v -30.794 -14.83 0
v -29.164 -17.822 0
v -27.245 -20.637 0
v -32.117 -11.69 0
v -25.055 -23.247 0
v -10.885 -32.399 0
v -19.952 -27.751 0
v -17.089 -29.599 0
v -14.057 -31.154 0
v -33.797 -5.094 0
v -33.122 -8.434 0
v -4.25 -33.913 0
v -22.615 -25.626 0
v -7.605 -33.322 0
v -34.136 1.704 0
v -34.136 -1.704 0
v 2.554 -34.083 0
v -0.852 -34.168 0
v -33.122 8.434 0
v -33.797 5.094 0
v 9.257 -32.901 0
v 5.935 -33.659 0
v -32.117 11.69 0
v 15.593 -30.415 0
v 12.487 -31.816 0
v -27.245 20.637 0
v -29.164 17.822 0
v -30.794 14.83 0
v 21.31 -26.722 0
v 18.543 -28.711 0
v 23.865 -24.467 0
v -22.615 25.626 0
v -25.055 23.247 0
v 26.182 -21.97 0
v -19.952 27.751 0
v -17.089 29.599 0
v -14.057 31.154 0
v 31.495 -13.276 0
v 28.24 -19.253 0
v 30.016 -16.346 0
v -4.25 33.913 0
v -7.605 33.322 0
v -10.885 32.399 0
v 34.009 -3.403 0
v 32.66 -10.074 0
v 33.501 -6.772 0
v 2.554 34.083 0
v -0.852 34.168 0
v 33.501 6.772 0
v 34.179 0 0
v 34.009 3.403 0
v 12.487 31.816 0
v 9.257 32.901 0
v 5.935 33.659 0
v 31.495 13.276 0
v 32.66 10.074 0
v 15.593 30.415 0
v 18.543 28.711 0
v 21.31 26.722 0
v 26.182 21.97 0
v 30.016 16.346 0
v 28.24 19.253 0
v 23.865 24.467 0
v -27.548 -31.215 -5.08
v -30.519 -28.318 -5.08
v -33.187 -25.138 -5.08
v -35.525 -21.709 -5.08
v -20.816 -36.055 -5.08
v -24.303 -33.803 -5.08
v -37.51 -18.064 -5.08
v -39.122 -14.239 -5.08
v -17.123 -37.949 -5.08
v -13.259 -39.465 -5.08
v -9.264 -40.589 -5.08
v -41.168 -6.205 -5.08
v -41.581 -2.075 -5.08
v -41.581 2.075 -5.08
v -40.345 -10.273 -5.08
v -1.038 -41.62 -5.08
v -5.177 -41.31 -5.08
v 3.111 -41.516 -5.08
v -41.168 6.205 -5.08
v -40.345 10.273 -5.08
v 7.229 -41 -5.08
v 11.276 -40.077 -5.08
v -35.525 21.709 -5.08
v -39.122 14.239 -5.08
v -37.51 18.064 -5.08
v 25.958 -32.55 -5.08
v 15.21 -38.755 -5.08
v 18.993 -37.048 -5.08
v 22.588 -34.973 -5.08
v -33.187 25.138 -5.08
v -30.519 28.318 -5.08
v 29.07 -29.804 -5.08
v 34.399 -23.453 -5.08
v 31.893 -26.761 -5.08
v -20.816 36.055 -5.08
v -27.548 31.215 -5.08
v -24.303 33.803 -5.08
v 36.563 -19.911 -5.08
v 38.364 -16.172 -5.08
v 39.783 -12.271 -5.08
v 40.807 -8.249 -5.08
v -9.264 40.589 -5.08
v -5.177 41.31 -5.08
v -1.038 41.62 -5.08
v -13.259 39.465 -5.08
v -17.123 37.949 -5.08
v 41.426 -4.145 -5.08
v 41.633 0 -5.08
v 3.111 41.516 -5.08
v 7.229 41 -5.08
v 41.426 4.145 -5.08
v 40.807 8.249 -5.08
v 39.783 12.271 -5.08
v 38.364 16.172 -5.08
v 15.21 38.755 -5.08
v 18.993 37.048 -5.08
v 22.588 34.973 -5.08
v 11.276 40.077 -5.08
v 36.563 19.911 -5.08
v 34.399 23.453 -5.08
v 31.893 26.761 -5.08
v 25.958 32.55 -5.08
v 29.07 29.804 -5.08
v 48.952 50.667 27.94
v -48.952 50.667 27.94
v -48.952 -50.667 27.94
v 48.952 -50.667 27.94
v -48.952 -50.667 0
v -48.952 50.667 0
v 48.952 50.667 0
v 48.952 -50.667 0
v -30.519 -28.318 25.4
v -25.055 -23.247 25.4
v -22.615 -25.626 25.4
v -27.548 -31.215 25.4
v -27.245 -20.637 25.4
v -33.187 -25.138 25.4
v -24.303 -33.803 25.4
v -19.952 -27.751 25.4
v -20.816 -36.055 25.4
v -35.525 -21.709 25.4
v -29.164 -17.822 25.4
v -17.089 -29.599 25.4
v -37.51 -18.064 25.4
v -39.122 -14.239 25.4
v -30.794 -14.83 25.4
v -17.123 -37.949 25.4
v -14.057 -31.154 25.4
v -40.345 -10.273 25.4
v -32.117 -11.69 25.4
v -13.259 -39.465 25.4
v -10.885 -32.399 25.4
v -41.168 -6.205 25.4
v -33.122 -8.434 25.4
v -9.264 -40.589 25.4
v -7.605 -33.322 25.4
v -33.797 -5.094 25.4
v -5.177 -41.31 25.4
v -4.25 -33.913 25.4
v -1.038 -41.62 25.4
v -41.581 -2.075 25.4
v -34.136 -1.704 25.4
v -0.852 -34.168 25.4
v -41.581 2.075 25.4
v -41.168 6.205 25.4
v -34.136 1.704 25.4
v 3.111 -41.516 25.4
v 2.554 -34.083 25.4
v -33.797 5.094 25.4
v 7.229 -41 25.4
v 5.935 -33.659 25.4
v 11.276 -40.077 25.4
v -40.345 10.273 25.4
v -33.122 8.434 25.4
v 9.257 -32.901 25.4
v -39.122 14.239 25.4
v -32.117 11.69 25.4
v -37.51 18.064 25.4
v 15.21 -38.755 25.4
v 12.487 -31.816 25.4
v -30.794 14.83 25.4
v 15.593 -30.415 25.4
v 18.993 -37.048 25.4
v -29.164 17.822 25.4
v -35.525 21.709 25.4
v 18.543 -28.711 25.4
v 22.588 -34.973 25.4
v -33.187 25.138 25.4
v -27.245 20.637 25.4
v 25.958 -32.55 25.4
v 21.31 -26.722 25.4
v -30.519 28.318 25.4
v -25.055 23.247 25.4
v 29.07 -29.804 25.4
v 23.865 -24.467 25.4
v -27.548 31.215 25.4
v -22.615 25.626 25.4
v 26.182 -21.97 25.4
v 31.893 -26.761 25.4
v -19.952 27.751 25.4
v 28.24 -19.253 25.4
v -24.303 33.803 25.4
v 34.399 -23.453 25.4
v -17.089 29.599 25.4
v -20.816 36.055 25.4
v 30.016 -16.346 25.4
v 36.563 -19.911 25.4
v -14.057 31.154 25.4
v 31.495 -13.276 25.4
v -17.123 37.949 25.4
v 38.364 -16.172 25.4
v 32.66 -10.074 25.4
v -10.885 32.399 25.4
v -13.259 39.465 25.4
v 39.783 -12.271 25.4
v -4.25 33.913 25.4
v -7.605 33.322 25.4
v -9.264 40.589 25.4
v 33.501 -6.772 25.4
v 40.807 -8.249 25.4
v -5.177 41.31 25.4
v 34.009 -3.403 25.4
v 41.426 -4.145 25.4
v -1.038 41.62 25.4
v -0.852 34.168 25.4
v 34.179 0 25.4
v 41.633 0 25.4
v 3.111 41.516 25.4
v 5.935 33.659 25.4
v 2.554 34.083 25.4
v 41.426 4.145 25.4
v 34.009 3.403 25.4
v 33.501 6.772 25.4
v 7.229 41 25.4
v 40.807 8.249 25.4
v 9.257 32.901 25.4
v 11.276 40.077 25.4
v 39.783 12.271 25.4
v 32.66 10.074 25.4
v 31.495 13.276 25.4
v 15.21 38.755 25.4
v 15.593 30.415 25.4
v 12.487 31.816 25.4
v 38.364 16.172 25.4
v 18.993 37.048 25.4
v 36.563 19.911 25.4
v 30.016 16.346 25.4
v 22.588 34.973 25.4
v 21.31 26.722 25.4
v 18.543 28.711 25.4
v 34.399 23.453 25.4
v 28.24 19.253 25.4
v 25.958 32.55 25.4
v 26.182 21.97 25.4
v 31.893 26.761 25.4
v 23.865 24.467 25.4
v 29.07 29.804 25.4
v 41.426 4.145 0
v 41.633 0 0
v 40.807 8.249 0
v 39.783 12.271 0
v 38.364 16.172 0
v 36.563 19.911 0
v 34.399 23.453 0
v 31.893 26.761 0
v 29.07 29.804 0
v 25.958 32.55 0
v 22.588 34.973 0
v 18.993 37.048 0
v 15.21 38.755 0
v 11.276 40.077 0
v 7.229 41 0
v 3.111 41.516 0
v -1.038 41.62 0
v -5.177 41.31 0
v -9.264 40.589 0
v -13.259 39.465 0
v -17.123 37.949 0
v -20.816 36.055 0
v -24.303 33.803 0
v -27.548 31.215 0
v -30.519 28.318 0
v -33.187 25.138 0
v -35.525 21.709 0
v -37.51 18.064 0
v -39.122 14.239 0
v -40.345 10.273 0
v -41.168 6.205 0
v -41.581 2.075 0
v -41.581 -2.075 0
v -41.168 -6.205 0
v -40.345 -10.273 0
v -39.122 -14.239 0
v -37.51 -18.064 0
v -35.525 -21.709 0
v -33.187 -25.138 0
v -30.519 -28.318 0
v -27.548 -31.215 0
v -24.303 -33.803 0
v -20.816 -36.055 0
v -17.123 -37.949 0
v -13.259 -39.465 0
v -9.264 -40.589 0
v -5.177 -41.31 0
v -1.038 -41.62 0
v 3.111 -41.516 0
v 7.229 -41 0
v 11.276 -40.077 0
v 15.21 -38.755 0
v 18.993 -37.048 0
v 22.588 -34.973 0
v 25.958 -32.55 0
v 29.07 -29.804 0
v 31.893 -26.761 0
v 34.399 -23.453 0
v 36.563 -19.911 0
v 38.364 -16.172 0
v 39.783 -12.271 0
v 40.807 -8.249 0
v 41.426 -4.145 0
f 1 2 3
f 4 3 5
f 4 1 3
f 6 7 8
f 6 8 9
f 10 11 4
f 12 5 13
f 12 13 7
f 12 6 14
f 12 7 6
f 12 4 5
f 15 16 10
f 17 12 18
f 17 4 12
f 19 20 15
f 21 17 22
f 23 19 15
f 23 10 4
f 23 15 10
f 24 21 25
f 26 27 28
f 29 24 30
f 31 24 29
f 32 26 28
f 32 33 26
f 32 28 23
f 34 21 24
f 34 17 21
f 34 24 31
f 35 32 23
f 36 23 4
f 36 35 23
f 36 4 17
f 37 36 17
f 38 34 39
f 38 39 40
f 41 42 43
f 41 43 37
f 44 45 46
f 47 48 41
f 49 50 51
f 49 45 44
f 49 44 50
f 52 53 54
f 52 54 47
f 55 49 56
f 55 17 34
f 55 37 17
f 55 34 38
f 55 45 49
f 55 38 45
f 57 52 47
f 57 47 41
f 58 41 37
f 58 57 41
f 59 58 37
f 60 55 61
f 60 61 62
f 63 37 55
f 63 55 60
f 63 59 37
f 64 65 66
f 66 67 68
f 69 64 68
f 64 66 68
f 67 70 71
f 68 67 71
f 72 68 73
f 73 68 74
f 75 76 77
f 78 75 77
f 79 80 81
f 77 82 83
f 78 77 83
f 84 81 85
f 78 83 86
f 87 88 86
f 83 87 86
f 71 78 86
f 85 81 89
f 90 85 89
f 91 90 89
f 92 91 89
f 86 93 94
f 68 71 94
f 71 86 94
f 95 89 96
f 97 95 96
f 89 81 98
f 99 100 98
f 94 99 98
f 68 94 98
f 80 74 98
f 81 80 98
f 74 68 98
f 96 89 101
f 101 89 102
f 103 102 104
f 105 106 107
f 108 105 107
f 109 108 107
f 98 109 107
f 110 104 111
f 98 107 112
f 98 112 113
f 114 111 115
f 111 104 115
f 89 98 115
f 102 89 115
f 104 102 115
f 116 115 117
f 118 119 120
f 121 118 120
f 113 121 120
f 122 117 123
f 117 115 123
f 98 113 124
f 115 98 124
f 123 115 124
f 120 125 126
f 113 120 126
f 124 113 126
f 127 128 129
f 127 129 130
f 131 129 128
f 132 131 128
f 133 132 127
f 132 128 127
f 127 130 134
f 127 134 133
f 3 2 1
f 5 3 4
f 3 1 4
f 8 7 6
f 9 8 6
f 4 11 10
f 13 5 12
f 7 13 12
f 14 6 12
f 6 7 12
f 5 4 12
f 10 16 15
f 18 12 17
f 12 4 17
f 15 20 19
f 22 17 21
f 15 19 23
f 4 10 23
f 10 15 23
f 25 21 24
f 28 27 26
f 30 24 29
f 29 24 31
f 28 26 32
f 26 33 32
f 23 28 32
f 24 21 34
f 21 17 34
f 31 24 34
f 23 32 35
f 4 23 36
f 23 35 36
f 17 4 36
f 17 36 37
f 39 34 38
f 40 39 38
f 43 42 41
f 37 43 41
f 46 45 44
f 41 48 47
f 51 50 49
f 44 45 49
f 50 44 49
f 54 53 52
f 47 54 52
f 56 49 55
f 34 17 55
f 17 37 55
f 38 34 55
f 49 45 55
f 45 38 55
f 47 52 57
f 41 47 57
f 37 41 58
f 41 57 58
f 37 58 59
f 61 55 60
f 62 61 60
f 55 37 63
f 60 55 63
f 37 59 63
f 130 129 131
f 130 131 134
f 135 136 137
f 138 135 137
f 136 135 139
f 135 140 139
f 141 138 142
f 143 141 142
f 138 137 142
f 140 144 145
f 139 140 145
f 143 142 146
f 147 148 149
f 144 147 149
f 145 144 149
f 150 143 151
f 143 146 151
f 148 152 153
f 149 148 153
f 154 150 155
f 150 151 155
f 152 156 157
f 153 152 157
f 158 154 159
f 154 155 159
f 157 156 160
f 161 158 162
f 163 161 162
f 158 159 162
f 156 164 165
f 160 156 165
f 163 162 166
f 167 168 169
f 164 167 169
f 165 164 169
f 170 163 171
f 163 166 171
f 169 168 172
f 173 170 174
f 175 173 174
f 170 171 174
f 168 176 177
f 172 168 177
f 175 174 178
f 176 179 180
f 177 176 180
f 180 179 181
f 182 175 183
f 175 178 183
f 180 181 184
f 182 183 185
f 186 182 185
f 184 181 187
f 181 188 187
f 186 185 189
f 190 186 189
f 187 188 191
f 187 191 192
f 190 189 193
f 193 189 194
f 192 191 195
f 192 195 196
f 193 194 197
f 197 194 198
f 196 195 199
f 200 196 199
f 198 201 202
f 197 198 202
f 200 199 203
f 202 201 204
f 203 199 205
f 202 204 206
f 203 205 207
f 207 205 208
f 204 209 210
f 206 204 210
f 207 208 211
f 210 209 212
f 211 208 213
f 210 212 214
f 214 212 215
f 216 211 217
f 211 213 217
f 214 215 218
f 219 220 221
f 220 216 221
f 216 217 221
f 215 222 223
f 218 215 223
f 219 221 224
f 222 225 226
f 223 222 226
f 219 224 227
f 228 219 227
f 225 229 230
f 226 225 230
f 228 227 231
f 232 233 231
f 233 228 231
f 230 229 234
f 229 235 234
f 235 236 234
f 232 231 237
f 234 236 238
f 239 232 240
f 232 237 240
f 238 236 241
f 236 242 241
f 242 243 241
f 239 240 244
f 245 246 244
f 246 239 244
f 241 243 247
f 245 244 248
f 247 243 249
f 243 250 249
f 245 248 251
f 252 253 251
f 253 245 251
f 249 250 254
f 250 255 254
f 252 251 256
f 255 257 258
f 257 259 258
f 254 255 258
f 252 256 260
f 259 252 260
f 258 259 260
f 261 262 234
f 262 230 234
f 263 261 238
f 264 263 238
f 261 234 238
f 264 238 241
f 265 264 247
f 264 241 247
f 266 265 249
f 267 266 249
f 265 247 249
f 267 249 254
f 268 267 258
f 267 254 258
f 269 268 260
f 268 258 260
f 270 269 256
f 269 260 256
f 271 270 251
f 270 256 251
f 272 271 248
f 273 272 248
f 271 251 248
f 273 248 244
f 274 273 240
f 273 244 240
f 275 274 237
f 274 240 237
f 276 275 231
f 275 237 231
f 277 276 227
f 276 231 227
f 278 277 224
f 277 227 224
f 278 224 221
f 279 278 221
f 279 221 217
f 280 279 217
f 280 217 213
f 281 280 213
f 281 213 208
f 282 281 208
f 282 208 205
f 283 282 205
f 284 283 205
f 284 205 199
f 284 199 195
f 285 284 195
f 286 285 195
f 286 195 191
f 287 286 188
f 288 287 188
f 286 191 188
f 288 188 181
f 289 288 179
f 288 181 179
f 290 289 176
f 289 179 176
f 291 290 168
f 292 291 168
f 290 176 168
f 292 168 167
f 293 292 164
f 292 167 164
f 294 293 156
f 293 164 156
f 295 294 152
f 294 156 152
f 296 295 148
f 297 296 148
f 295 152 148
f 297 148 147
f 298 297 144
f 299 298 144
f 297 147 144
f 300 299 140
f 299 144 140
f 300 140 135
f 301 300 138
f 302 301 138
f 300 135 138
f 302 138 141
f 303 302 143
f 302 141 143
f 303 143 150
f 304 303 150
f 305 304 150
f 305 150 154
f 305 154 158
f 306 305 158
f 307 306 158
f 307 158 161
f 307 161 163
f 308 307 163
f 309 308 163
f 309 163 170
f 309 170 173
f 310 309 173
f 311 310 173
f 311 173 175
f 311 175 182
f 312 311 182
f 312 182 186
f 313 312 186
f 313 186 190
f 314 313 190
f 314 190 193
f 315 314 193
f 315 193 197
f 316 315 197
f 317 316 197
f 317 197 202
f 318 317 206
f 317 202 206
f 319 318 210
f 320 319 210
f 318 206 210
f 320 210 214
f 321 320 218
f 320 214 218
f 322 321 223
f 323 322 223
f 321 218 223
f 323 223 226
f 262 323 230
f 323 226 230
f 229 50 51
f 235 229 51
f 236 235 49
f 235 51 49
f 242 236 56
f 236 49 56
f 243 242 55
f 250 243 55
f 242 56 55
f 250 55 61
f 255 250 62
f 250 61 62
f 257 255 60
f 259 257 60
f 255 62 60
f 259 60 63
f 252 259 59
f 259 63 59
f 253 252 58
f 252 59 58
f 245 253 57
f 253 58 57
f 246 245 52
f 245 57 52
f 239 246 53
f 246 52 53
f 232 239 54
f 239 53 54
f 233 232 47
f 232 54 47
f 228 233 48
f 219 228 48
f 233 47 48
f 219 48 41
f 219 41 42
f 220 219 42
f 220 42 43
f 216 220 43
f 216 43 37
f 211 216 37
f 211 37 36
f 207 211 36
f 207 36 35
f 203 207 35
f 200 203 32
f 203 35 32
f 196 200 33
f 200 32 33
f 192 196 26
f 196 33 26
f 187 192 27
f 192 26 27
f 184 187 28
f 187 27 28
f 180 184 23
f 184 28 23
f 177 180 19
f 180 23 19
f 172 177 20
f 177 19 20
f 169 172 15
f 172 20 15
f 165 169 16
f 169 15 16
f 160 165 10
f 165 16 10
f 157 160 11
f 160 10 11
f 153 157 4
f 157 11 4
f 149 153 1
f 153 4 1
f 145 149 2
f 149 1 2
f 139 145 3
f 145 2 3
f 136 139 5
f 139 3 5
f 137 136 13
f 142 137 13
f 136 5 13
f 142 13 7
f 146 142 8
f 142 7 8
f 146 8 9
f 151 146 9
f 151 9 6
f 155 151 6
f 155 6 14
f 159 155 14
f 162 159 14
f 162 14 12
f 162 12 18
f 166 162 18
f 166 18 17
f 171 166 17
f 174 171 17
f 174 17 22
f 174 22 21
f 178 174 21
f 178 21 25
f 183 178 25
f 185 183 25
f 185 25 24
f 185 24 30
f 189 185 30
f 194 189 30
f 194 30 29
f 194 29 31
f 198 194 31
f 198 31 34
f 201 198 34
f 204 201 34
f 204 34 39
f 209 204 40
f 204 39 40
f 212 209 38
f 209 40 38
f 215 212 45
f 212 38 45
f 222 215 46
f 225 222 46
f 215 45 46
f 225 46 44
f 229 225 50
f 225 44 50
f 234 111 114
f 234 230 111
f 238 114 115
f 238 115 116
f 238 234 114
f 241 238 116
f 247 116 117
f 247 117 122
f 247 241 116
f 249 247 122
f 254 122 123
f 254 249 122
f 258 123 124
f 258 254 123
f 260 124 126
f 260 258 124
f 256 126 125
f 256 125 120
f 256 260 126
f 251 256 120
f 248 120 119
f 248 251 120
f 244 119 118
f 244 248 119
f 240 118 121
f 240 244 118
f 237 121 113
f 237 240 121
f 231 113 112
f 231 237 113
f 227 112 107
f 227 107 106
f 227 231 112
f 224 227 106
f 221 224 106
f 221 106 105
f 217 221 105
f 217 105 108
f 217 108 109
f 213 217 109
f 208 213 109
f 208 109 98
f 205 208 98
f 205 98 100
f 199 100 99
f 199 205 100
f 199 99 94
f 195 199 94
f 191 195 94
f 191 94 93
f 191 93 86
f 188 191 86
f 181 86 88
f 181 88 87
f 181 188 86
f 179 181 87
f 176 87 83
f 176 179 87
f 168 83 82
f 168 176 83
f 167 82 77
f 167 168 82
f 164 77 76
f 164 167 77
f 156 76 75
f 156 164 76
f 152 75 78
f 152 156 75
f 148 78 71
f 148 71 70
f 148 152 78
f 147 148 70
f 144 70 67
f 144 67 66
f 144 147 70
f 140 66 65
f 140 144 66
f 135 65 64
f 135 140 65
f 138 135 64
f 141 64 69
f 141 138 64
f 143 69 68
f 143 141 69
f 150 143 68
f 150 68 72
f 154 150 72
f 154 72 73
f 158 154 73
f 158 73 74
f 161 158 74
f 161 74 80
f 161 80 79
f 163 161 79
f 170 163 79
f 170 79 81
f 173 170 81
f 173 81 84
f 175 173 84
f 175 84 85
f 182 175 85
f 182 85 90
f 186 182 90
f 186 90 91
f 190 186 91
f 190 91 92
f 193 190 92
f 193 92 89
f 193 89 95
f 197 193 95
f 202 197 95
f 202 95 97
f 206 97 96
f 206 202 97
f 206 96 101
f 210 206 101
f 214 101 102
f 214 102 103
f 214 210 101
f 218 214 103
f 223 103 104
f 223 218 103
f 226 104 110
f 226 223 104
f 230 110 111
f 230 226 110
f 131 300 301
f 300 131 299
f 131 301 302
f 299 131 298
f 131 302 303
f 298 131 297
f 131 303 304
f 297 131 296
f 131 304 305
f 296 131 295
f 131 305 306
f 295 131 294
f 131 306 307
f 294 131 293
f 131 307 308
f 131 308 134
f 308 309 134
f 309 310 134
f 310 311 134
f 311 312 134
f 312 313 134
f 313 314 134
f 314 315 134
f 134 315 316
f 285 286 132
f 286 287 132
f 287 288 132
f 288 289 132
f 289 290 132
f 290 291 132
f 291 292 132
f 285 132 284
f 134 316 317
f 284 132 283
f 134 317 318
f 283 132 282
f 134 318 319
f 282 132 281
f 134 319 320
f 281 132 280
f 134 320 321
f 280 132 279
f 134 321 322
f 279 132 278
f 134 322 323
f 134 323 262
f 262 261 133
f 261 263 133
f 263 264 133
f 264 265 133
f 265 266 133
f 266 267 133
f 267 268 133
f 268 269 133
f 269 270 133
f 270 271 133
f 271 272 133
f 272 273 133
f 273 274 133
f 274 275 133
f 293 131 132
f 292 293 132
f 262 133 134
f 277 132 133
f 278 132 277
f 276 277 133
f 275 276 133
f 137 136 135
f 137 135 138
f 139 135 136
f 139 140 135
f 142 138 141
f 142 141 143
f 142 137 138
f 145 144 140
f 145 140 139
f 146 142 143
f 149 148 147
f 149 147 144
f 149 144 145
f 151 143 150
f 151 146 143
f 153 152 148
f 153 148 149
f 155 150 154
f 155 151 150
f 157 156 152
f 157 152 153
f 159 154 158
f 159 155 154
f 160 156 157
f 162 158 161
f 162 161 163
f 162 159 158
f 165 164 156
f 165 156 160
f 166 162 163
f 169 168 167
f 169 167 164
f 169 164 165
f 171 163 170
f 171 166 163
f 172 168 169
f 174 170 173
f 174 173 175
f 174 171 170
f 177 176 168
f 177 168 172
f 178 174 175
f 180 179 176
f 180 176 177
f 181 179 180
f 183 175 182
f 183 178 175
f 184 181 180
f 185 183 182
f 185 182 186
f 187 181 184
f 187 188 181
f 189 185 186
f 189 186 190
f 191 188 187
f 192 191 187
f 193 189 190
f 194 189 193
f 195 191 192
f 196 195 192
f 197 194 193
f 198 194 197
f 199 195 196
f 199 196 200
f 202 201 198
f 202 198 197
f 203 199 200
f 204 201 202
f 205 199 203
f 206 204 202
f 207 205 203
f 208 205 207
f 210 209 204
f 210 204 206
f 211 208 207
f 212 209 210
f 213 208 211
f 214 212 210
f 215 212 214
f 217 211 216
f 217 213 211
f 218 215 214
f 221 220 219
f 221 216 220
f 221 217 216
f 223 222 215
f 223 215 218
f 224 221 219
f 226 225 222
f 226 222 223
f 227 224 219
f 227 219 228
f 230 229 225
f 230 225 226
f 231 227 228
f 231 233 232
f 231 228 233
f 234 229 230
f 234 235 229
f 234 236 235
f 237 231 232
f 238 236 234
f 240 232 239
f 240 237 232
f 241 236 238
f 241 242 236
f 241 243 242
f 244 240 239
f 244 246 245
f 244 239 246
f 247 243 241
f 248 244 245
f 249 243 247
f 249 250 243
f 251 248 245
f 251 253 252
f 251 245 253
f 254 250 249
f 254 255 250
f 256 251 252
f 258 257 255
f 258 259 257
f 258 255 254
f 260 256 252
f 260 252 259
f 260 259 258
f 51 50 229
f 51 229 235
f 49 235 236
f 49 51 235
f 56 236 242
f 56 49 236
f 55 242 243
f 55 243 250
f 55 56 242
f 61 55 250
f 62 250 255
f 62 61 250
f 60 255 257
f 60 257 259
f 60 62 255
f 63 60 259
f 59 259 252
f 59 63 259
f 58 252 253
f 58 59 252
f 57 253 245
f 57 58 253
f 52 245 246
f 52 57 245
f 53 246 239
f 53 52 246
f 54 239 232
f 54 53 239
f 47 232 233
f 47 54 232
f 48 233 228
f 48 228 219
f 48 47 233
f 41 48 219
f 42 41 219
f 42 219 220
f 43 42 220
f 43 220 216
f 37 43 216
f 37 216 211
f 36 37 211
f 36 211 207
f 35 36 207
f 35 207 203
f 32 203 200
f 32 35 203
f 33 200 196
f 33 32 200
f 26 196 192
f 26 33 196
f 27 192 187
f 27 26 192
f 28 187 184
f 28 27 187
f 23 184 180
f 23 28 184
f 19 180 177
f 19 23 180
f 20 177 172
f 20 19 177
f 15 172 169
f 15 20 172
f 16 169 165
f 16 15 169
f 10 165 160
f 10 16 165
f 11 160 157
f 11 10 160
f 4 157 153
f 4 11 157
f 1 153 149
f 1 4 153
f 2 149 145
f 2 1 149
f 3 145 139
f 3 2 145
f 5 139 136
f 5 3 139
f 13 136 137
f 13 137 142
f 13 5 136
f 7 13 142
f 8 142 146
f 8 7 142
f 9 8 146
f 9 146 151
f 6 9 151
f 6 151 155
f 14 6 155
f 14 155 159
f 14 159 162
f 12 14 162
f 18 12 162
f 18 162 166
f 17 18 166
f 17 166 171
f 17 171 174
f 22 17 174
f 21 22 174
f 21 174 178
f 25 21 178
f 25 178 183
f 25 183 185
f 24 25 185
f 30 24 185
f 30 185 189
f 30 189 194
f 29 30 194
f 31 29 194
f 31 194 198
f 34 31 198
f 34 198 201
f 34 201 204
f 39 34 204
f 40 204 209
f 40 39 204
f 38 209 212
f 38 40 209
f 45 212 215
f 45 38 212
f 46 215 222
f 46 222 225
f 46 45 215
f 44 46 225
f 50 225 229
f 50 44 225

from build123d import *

# Parameters (mm, degrees)
F0_R          = 41.632811
F0_R_2        = 34.178554
F1_DEPTH      = 25.4
F2_DEPTH      = 5.08
F3_W          = 97.903654
F3_H          = 101.333394
F3_R          = 41.632811
F3_R_2        = 34.178554
F4_DEPTH      = 2.54
F4_DEPTH_BACK = 25.4


with BuildPart() as f1:
    # F0 (on Top) → F1 (new body)
    with BuildSketch(Plane.XY):
        Circle(F0_R)
        Circle(F0_R_2, mode=Mode.SUBTRACT)
    extrude(amount=F1_DEPTH)

    # F0 (on Top) → F2 (join)
    with BuildSketch(Plane.XY):
        Circle(F0_R)
        Circle(F0_R_2, mode=Mode.SUBTRACT)
        Circle(F0_R_2)
    extrude(amount=-F2_DEPTH)


with BuildPart() as f4:
    # F3 (on face) → F4 (new body, two sides)
    with BuildSketch(Plane.XY.offset(25.4)) as f4_sk:
        Rectangle(F3_W, F3_H)
        Circle(F3_R, mode=Mode.SUBTRACT)
        Circle(F3_R)
        Circle(F3_R_2, mode=Mode.SUBTRACT)
        Circle(F3_R_2)
    extrude(amount=F4_DEPTH)
    extrude(f4_sk.sketch, amount=-F4_DEPTH_BACK)

    # F5: cut F1
    add(f1.part, mode=Mode.SUBTRACT)


solid = Compound([f1.part, f4.part])
